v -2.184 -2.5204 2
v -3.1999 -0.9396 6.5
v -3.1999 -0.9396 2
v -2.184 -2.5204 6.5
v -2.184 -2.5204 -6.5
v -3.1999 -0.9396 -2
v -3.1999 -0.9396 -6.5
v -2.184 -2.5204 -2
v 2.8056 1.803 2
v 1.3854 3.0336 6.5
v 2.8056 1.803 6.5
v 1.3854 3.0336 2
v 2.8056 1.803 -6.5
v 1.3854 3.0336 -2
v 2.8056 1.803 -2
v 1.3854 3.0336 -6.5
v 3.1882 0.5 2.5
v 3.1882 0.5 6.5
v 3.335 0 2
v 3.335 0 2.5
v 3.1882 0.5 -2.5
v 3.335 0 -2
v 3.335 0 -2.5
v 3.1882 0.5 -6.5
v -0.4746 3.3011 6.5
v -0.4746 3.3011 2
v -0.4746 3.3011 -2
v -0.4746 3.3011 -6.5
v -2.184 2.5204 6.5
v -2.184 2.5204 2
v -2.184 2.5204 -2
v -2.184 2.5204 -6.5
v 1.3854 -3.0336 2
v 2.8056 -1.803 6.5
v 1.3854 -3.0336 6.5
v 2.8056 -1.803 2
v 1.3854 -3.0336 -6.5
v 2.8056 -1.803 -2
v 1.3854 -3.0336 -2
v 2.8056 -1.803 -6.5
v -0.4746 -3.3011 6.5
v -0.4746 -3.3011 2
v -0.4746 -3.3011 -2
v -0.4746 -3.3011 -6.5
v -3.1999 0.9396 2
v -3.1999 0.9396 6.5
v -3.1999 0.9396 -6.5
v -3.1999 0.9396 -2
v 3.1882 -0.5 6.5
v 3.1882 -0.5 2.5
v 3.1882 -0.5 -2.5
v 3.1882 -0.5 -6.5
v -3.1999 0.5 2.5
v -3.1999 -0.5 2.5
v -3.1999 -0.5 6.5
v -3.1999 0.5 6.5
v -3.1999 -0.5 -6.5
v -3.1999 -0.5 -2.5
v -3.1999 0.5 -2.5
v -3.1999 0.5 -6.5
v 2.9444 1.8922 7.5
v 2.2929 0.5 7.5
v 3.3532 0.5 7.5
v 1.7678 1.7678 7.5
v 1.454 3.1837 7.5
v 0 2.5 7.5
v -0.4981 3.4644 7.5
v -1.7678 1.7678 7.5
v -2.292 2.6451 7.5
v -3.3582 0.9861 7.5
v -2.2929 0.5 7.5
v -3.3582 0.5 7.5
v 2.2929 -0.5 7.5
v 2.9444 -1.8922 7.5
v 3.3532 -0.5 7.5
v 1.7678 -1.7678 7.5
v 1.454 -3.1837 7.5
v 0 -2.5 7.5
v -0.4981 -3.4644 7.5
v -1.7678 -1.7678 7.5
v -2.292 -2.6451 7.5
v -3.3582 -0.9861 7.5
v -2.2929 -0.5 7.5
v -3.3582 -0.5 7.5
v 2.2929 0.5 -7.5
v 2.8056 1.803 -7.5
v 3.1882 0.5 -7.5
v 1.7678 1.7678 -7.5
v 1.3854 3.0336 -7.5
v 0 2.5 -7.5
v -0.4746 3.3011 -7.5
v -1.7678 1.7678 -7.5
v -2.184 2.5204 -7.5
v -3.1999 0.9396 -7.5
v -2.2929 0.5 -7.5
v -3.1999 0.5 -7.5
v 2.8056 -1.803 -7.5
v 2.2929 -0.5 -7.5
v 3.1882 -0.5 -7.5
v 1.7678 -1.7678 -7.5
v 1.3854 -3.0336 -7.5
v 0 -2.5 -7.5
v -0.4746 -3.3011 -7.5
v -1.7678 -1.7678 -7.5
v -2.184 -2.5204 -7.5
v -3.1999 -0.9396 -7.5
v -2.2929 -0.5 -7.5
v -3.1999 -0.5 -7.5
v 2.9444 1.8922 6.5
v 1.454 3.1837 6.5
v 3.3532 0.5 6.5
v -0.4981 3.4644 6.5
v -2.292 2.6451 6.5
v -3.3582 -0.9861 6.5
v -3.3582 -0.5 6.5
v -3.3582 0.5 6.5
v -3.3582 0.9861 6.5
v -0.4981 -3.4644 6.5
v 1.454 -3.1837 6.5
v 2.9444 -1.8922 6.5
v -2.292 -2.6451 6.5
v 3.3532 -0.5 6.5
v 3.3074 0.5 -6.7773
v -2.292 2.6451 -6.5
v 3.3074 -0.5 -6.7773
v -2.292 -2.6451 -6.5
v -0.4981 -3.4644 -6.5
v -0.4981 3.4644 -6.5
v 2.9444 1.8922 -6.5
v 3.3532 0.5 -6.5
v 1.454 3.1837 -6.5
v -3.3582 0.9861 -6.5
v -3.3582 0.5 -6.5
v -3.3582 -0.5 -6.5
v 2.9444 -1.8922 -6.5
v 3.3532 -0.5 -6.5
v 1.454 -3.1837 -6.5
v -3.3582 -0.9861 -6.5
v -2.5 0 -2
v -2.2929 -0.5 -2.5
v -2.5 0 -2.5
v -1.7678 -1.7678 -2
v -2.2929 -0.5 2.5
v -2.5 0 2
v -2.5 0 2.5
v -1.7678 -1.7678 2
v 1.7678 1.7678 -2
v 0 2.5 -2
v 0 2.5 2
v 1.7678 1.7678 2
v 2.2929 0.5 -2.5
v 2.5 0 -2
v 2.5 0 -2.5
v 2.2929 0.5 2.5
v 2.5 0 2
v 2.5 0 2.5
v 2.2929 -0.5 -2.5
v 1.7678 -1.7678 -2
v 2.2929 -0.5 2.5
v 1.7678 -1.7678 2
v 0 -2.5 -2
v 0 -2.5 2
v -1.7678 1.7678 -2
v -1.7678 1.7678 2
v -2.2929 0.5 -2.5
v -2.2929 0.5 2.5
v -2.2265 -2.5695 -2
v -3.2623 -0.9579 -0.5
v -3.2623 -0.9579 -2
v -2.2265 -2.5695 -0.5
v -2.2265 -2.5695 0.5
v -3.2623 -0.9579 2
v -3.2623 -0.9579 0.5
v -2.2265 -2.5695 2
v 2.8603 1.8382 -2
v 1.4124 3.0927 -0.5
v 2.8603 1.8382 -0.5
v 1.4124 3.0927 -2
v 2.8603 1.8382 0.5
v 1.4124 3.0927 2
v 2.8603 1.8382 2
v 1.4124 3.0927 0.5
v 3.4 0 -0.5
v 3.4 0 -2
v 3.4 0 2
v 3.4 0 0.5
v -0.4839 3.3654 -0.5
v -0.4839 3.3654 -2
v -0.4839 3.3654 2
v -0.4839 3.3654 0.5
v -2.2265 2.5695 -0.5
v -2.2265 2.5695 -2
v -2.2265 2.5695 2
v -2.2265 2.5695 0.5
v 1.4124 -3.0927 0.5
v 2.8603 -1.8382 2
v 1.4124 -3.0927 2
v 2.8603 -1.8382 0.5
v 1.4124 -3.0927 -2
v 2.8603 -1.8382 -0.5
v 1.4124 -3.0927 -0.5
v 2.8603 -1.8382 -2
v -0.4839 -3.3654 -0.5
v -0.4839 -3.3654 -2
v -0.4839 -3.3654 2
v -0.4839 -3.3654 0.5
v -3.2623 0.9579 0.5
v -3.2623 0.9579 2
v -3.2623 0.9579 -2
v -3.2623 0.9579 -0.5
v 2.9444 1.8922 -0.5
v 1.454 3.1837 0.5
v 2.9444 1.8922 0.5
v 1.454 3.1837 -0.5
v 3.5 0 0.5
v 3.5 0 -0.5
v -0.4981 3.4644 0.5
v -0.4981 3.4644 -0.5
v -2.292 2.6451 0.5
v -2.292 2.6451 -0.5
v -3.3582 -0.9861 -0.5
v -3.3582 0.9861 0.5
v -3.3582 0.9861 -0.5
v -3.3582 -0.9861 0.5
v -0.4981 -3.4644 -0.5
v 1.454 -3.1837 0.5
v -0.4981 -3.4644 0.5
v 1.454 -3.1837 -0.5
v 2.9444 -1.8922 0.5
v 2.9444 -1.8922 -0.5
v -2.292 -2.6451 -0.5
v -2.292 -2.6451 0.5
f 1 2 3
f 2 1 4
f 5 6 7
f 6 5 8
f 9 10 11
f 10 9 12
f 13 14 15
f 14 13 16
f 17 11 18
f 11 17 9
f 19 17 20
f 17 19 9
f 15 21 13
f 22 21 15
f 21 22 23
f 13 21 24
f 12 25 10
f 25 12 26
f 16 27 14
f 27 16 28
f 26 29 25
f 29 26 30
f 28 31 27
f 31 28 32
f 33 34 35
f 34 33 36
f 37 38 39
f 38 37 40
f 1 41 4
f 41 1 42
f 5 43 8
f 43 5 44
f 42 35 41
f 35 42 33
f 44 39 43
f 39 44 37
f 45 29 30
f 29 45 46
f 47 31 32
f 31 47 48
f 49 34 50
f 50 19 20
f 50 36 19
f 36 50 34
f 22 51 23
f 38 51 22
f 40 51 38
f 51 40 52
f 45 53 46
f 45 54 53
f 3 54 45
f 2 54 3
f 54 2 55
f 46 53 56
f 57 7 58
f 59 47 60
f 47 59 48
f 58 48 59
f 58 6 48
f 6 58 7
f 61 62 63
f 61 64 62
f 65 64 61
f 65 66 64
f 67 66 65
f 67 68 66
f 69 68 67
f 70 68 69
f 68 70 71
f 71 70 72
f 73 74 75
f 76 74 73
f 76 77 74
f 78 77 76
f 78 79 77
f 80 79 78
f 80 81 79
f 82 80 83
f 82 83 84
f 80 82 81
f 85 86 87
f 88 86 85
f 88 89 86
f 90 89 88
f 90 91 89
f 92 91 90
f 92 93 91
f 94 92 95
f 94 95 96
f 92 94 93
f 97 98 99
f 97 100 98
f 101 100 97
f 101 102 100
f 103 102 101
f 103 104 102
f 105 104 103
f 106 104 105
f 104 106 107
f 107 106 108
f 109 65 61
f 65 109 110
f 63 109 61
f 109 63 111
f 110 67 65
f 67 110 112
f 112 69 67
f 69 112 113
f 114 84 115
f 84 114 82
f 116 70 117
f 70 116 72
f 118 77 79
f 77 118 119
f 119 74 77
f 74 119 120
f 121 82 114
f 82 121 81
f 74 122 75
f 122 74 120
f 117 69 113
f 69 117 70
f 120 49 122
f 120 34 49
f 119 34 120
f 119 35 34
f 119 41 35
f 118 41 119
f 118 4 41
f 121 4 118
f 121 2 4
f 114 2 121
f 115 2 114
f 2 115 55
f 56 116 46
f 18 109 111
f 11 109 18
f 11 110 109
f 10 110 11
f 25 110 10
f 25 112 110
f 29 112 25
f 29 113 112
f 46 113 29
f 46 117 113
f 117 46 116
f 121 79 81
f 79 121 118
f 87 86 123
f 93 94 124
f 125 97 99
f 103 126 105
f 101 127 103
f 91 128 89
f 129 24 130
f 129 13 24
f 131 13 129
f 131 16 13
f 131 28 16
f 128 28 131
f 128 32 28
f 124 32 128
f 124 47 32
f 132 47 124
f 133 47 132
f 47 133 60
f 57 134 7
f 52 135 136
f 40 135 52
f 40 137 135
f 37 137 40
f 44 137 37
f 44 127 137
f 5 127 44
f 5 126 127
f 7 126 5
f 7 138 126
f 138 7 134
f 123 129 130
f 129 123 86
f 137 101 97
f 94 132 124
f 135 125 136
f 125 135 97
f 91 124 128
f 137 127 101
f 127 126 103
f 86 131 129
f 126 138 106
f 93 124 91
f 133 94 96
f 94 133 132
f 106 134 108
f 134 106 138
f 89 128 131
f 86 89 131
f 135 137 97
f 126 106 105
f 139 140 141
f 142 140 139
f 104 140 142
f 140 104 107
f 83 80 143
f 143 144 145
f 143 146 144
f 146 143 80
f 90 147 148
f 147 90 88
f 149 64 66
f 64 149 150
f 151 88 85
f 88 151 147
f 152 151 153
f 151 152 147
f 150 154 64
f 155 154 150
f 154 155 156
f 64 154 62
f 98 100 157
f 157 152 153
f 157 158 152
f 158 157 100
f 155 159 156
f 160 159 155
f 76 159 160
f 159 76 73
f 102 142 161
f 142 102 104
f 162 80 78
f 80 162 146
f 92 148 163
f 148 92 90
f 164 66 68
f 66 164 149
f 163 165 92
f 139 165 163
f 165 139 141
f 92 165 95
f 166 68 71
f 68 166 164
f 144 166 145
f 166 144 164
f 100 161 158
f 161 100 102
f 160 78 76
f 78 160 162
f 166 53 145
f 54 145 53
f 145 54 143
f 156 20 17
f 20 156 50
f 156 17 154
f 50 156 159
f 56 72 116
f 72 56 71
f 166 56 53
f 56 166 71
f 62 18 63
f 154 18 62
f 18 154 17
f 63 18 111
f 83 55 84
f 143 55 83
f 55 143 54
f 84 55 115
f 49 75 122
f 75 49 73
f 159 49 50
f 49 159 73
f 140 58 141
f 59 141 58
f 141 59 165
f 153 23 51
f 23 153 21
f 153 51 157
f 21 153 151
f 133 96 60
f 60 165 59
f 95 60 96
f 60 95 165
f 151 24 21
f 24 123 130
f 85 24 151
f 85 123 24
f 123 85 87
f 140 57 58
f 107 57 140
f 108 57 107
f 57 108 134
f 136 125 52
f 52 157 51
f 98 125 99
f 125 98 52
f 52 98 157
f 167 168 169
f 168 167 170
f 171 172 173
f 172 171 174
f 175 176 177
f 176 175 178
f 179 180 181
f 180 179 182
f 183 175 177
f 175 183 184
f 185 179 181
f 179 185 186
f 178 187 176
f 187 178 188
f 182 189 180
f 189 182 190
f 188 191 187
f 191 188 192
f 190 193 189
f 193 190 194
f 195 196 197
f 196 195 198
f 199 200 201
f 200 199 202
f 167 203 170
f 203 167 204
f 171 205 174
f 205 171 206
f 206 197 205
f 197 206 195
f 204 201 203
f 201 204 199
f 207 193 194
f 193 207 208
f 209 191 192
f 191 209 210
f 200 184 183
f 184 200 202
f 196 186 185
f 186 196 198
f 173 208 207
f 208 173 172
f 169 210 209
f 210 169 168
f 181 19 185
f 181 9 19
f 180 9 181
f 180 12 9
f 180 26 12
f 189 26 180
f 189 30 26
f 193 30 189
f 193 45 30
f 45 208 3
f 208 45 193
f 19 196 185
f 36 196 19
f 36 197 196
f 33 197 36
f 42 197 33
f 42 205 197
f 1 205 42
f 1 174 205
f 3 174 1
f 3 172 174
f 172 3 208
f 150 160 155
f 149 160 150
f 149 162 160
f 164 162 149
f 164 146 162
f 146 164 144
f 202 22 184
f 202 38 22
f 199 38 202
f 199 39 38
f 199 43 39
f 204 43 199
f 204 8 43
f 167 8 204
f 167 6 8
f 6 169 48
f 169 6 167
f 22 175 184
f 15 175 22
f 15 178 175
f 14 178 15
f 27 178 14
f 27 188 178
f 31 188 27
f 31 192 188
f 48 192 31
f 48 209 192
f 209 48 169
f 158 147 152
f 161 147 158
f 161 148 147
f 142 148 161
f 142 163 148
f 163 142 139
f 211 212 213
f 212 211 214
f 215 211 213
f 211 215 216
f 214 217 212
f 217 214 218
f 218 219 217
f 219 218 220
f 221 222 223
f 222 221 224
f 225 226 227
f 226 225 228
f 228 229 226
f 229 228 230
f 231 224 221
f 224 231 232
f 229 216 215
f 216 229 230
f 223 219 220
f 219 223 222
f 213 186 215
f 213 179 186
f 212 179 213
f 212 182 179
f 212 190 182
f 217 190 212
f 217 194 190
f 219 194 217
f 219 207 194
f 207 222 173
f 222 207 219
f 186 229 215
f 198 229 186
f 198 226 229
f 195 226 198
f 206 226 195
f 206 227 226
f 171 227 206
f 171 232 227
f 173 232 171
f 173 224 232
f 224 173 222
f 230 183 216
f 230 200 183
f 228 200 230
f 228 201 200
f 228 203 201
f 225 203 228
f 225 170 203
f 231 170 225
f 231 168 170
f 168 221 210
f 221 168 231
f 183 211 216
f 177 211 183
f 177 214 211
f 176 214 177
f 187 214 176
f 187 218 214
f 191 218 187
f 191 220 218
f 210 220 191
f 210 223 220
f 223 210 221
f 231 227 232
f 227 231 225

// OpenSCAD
// Connector for connecting Automoblox parts.

render_part=1; // Automoblox_Connector()

module Automoblox_Connector(length=15.0) {
  cylinder(r=6.8/2,h=4.0,center=true);
  cylinder(r=7.0/2,h=1.0,center=true);
  difference() {
    union() {
      cylinder(r=6.67/2,h=length,center=true);
      translate([0,0,length/2-0.5]) cylinder(r=7.0/2,h=1.0,center=true);
      translate([0,0,-length/2+0.5]) cylinder(r1=6.67/2,r2=7.0/2,h=1.0,center=true);
    }
    cylinder(r=5.0/2,h=2*8,center=true);
    translate([0,0,5.1]) cube(size=[8.0,1.0,5.2],center=true);
    translate([0,0,-5.1]) cube(size=[8.0,1.0,5.2],center=true);
  }
}

if(render_part==1) {
  echo("Rendering Automoblox_Connector()...");
  Automoblox_Connector();
}
